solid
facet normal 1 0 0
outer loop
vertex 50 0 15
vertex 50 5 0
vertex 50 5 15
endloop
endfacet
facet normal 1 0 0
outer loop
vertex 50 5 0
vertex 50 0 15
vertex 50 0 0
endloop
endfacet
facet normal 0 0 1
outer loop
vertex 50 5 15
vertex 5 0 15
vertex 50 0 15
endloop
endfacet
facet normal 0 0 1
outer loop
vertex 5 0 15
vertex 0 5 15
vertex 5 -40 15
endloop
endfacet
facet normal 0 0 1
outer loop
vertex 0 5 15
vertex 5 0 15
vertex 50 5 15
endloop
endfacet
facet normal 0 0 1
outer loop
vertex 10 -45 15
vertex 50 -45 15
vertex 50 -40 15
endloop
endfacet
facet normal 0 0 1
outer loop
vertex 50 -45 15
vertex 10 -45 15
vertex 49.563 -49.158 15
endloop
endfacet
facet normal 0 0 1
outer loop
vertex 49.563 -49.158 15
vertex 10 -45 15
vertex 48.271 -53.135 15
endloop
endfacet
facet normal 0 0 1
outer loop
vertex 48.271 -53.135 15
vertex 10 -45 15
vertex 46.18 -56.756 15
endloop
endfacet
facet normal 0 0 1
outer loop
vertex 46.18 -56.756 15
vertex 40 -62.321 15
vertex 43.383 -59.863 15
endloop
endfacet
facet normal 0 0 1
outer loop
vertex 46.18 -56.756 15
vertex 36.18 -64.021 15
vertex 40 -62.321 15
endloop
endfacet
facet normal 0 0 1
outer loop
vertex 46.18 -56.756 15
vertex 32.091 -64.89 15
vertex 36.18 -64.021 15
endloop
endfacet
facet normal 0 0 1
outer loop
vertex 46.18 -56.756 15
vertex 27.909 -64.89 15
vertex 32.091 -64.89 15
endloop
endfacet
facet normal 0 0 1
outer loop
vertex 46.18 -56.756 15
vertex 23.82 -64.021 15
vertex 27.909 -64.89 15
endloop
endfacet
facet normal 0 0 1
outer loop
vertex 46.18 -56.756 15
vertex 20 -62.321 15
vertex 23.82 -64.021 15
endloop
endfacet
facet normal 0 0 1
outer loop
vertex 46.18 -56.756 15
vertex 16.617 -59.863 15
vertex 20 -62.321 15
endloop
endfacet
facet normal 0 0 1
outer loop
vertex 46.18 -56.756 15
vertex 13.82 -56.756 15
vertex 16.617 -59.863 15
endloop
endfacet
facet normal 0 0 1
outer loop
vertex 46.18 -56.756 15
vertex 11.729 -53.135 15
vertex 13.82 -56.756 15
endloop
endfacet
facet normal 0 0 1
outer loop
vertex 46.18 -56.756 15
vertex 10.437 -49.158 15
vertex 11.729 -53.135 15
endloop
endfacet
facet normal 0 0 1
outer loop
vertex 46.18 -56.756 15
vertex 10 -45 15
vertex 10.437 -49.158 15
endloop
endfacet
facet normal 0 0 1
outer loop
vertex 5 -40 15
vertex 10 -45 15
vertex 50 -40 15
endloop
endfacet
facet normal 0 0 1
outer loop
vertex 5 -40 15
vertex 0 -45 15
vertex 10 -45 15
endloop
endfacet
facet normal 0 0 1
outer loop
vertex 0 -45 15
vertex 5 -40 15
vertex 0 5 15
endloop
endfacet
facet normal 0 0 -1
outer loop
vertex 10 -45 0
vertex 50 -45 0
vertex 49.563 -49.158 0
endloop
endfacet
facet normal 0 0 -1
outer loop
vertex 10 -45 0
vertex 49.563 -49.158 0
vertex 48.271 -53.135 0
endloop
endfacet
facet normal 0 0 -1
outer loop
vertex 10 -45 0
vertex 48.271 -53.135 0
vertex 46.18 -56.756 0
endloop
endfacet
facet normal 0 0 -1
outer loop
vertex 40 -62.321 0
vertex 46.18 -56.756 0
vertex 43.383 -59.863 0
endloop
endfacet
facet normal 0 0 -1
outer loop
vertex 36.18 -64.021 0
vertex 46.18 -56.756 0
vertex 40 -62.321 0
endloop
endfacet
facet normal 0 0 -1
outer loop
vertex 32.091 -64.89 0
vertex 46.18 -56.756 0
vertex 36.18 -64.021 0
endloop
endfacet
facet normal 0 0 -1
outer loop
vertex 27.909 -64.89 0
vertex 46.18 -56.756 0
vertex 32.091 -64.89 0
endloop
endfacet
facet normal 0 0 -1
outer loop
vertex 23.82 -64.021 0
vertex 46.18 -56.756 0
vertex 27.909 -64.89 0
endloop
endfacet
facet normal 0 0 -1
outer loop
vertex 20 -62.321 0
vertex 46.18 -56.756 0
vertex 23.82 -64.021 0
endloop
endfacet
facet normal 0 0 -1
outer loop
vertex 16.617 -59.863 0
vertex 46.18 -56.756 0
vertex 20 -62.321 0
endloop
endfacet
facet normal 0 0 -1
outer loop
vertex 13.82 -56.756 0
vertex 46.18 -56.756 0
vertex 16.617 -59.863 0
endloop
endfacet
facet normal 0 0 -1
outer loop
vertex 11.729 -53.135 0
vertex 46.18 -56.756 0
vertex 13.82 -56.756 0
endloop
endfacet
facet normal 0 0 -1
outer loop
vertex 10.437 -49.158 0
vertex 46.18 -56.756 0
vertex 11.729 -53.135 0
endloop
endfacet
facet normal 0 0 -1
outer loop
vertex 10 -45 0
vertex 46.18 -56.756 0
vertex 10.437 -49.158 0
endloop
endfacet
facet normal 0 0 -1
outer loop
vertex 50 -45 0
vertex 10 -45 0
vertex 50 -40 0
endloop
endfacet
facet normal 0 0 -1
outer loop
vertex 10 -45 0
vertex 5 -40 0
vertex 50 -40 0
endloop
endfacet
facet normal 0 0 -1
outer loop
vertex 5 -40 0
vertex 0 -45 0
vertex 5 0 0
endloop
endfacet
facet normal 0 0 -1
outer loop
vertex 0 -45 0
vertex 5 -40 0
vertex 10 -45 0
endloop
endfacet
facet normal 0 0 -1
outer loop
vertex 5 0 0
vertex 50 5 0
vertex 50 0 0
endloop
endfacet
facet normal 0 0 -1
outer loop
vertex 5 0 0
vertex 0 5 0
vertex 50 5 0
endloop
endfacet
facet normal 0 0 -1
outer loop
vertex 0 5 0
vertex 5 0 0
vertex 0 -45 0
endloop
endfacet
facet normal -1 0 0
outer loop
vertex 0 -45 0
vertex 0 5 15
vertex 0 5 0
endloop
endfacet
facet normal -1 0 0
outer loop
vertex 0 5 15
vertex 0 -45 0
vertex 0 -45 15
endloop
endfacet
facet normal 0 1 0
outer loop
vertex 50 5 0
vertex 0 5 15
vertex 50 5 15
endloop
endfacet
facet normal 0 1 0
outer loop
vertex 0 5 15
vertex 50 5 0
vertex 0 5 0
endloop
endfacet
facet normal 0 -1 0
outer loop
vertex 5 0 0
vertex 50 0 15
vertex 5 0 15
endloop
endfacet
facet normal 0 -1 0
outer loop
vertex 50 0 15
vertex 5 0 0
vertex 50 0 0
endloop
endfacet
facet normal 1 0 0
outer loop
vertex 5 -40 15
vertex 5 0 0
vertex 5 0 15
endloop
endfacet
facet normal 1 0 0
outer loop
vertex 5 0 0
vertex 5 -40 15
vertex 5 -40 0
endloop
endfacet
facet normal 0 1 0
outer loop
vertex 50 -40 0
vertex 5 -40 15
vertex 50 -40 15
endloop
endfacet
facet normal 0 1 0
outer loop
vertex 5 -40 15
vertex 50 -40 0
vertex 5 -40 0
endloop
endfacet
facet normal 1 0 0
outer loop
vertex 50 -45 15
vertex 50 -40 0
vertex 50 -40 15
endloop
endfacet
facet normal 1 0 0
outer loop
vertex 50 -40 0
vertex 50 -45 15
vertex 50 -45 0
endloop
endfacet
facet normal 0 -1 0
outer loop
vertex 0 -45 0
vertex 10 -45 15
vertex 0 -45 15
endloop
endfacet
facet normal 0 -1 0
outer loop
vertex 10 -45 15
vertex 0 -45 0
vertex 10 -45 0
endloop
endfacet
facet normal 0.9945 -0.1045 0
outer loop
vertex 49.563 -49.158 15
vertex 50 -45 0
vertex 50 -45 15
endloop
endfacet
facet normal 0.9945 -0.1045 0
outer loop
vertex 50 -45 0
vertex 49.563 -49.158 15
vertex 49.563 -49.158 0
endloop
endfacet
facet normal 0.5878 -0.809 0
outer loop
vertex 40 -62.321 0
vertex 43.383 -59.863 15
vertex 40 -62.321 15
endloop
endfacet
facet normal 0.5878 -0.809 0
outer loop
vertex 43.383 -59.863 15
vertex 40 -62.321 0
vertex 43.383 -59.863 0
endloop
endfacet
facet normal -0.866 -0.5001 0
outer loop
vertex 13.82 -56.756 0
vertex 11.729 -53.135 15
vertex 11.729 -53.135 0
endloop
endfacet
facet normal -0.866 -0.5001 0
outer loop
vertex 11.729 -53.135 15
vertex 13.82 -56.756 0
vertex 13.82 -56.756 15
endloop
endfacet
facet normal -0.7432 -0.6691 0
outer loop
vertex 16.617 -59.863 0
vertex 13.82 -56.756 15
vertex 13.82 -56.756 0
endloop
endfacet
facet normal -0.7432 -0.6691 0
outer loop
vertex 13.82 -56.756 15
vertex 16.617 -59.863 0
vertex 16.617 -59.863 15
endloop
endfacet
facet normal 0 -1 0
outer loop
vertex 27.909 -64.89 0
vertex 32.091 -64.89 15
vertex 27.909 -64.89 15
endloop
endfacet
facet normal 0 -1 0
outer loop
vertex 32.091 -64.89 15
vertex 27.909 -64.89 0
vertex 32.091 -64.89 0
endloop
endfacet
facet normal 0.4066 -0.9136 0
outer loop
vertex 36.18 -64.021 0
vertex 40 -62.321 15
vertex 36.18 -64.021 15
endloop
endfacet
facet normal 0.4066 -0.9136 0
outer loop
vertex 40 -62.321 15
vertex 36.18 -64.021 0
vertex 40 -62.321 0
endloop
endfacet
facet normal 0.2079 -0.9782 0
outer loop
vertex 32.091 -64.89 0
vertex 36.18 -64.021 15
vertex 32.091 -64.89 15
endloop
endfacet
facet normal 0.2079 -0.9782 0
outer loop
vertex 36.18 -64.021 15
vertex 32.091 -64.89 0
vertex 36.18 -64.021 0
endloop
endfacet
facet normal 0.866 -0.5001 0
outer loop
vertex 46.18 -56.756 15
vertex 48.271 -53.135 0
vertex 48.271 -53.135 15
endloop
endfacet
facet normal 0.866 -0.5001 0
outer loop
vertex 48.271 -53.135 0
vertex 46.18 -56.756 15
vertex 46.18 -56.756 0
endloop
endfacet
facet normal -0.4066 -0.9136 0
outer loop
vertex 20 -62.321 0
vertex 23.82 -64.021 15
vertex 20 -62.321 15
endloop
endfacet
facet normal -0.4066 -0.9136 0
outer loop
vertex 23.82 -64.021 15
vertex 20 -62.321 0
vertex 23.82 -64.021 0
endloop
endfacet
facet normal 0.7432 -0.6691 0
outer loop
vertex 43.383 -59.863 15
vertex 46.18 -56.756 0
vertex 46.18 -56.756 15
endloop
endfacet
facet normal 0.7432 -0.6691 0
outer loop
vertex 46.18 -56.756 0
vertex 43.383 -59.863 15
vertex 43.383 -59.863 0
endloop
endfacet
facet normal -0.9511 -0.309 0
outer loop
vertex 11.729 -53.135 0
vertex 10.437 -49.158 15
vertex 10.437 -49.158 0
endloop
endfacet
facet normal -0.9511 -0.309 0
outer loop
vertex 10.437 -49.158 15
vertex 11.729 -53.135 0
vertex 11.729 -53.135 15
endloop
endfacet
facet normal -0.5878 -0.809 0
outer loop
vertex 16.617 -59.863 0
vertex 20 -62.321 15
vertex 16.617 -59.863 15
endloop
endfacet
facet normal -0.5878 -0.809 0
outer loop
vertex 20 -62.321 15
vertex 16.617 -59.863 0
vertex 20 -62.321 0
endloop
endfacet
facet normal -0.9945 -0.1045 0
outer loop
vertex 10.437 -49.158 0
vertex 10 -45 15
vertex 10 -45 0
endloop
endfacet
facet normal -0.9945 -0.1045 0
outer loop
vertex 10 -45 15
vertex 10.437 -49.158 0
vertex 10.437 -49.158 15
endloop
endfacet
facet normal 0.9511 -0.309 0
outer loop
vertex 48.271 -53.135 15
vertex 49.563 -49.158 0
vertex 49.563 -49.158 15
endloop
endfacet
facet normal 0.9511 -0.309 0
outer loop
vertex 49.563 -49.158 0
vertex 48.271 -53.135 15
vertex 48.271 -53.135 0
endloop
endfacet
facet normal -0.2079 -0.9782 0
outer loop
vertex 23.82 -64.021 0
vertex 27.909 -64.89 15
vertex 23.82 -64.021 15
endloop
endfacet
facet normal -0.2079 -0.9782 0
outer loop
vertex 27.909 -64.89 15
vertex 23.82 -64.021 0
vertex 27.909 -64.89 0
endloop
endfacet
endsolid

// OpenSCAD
// Parametric Desk-Clamp Hook
// Designed by knarfishness for
// dieselpoweredrobotics.com


// Clamp Spacing
clamp_spacing = 40;

// The thickness of the hook
thickness = 5;

// The length of the top-bar
top_bar_length = 50;

// The radius of the hook
hook_radius = 20;

// The size of the hook-end
hook_end_radius = 0;

// Overall hook width
width = 15;


module hook()
{
	module topbar()
	{
		cube([top_bar_length, thickness, width]);
	}
	
	module clampbar()
	{
		translate([0,0-clamp_spacing,0])
		cube([thickness,clamp_spacing,width]);
	}
	
	module bottombar()
	{
		translate([0,0-clamp_spacing-thickness,0])
		cube([top_bar_length,thickness,width]);
	}
	
	module clamp()
	{
		union()
		{
			topbar();
			clampbar();

		}
	}
	
	module wholeclamp()
	{
		union()
		{
			clamp();
			bottombar();
		}
	}
	
	module hookloop()
	{
		translate([top_bar_length-hook_radius,0-clamp_spacing-thickness,0])
		intersection()
		{
			translate([-hook_radius,-hook_radius*2,0])
			cube([hook_radius*2,hook_radius*2,width]);

			cylinder(h = width, r1 = hook_radius, r2 = hook_radius, center = false);
		}
		
		
		//
	}
	
	module hookend()
	{
	
	}
	
	wholeclamp();
	hookloop();
	
}

hook();
